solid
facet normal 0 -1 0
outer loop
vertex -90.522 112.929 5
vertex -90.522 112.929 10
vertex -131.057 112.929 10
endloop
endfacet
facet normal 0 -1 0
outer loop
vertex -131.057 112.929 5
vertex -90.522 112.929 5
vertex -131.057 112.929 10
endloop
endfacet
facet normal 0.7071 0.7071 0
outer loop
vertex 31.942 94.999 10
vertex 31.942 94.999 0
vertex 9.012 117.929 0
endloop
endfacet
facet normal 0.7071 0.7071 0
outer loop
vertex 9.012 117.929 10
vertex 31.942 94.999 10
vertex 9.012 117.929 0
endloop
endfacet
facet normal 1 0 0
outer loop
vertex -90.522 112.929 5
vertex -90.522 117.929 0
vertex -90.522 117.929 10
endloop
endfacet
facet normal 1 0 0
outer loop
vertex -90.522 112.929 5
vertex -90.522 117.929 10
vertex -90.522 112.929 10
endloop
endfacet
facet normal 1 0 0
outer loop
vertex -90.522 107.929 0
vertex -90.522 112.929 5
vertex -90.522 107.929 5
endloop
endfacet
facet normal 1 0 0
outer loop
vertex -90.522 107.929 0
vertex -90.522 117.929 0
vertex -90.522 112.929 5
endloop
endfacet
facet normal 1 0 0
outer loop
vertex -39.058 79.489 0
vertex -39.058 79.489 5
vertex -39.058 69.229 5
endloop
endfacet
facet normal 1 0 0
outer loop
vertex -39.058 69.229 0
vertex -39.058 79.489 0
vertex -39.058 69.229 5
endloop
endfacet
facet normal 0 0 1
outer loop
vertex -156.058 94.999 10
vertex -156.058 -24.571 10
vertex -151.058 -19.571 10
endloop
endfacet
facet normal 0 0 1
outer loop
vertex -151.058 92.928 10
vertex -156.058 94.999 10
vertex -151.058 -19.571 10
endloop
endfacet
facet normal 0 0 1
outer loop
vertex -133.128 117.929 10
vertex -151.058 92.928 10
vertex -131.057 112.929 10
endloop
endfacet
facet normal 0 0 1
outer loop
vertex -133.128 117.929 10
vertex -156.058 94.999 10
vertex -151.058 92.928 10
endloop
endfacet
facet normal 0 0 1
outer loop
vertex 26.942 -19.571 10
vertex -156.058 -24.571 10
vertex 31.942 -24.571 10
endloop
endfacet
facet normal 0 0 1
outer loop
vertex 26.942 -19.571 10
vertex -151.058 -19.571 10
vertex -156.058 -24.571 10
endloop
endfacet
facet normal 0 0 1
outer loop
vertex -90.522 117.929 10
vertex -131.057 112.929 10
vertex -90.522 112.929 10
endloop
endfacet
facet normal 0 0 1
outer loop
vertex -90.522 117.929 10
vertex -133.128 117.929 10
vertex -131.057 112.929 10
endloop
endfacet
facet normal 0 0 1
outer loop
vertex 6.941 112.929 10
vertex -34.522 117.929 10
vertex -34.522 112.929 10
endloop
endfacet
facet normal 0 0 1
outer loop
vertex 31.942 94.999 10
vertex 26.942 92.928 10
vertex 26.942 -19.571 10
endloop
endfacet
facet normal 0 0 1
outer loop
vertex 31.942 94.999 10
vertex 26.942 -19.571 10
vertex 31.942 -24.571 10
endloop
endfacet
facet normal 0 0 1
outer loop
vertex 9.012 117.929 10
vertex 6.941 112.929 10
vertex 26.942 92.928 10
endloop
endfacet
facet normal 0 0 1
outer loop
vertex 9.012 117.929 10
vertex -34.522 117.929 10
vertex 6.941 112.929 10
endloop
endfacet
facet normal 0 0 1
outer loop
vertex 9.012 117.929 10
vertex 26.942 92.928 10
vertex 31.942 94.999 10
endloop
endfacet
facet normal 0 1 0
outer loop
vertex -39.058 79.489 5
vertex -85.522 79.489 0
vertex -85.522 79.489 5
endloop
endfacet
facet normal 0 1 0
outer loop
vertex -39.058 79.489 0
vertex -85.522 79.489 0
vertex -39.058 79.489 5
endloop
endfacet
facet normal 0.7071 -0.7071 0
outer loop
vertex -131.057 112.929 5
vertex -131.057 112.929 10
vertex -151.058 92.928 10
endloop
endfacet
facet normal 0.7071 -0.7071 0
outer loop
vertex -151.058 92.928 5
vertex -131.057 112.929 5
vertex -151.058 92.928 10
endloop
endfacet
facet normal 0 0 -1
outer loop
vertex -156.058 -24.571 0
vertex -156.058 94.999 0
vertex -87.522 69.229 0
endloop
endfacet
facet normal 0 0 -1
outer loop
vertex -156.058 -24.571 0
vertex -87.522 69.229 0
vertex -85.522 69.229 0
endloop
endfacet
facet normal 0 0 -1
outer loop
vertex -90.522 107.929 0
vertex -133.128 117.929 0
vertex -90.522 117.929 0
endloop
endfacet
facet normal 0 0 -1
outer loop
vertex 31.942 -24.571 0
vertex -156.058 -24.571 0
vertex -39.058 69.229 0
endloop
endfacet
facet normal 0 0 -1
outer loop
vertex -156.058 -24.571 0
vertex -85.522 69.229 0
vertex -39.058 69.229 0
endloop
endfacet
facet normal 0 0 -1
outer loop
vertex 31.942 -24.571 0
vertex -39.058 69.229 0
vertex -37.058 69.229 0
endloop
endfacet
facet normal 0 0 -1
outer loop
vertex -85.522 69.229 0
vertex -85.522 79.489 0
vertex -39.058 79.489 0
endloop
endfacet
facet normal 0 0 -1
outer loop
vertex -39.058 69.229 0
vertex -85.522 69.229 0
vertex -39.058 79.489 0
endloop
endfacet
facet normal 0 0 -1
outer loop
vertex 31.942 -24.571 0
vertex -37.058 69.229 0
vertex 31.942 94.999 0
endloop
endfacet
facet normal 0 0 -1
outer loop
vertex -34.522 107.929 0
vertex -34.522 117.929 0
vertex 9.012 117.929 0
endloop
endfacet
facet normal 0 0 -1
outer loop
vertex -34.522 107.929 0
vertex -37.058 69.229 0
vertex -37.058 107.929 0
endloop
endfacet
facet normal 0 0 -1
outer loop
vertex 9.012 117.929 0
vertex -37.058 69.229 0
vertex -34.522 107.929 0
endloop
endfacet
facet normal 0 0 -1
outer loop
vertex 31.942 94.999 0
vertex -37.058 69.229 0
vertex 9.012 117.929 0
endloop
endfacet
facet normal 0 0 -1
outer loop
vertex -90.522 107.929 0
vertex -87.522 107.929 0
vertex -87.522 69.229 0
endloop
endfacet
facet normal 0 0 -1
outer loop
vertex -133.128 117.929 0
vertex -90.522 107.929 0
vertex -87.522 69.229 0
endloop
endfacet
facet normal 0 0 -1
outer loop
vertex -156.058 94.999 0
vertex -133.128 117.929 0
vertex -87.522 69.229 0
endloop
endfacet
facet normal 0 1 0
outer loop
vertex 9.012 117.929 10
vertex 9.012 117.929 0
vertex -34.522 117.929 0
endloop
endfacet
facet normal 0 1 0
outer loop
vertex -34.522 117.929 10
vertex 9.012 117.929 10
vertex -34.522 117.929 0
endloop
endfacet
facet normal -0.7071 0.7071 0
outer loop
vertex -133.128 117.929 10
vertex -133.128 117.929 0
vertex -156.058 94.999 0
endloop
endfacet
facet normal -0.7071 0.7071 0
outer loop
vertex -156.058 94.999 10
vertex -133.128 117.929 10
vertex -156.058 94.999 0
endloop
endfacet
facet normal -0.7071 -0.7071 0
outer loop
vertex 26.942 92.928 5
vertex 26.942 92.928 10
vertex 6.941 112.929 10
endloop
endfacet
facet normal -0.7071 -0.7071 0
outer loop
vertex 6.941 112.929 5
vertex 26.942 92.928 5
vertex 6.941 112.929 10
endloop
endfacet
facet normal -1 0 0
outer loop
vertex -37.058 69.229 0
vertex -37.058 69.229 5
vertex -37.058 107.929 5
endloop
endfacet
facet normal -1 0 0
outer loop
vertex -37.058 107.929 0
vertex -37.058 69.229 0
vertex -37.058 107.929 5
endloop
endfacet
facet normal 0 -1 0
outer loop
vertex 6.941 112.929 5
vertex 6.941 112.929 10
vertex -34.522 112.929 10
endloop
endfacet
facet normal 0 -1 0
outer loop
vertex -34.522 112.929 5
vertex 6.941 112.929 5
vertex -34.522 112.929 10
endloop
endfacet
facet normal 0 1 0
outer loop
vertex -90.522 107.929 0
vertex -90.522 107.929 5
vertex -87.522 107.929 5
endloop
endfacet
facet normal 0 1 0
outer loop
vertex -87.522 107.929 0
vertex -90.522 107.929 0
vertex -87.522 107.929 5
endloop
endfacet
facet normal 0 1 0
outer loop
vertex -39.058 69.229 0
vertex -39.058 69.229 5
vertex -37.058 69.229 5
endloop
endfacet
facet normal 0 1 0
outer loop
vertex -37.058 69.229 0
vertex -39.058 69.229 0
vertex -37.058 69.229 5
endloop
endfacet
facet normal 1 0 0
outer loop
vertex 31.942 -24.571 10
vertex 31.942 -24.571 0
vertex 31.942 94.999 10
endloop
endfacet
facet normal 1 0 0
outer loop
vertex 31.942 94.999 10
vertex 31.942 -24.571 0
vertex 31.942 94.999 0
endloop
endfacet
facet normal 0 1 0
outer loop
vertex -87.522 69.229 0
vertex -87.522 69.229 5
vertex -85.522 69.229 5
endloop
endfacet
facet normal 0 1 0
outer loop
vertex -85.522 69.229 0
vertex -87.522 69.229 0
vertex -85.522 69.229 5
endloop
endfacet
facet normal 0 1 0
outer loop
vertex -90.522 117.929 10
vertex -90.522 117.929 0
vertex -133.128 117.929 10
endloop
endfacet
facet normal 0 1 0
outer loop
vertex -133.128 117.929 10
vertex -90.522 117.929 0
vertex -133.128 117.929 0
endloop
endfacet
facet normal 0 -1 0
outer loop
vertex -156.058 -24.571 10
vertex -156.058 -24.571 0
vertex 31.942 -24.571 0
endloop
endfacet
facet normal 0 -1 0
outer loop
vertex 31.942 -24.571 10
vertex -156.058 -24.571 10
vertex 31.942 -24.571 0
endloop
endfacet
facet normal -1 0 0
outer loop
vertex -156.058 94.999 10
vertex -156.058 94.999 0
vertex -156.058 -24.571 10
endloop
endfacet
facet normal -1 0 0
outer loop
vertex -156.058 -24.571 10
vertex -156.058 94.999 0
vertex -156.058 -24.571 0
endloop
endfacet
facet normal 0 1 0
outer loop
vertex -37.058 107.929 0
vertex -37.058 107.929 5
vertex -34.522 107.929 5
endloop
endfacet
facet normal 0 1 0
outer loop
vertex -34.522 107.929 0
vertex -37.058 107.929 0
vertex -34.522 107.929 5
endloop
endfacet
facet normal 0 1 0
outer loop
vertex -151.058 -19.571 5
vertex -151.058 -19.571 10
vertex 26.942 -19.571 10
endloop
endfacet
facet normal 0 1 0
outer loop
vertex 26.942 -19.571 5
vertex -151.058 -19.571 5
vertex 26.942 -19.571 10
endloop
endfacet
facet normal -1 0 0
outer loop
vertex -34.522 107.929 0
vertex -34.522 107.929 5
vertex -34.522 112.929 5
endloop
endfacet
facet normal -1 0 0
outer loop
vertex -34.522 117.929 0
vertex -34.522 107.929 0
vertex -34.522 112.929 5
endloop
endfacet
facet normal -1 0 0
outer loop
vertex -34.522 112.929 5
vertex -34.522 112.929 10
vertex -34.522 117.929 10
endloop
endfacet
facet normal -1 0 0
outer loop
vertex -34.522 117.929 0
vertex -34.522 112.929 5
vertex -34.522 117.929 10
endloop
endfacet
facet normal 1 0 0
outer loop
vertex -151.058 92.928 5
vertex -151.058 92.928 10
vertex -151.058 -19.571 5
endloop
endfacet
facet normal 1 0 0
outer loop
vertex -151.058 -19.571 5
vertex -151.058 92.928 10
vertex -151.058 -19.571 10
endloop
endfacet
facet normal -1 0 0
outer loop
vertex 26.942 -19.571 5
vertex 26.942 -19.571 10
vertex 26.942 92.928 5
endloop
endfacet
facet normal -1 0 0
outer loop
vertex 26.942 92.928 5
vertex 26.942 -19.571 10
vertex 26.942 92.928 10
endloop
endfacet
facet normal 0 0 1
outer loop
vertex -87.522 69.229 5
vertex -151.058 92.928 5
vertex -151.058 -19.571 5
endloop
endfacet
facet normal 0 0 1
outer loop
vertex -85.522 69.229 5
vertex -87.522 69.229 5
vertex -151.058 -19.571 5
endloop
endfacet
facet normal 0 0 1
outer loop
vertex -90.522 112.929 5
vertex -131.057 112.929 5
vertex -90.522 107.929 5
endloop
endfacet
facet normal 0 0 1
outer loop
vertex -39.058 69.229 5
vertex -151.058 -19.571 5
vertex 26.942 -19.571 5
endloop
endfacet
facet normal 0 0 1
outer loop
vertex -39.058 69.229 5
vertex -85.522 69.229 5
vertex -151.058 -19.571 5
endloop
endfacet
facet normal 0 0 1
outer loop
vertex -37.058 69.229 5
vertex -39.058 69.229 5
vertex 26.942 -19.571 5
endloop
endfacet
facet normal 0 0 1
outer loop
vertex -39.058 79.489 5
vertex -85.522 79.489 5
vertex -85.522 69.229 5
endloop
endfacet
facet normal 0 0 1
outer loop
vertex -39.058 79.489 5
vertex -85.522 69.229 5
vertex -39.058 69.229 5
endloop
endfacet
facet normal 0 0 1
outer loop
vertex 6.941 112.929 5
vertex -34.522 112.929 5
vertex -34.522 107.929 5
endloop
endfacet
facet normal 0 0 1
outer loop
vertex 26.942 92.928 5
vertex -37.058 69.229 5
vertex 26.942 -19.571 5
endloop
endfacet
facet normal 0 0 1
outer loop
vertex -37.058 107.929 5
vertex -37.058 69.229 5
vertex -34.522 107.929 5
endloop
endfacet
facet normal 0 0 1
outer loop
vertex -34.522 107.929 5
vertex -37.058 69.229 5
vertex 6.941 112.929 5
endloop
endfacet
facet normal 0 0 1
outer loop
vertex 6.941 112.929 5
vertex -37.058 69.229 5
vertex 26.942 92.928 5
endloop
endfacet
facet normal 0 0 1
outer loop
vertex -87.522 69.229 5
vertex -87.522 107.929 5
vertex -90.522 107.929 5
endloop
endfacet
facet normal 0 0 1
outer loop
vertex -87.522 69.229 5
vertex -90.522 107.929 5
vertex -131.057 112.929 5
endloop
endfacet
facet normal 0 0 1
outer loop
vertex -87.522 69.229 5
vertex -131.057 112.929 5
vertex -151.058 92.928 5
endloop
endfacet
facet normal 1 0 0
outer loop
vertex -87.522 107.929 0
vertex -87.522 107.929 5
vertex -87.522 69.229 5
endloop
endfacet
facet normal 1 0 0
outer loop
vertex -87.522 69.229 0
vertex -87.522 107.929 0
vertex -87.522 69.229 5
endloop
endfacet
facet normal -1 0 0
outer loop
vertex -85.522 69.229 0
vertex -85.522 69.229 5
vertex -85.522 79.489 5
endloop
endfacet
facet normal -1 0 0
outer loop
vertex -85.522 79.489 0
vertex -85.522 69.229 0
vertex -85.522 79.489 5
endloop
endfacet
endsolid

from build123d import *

# Parameters (mm, degrees)
F1_DEPTH = 10
F3_DEPTH = 5
F5_DEPTH = 5
F6_W     = 56
F6_H     = 8
F6_W_2   = 46.4636435509
F6_H_2   = 28.4405329078
F7_DEPTH = 10


with BuildPart() as f1:
    # F0 (on Top) → F1 (new body)
    with BuildSketch(Plane.XY):
        Polygon((-156.0579602718, 94.9992052239), (-156.0579602718, -24.5707947761), (31.9420397282, -24.5707947761), (31.9420397282, 94.9992052239), (9.0120397282, 117.9292052239), (-133.1279602718, 117.9292052239), align=None)
    extrude(amount=F1_DEPTH)

    # F2 (on face) → F3 (cut)
    with BuildSketch(Plane.XY.offset(10)):
        Polygon((26.9420397282, 92.9281374121), (6.9409719163, 112.9292052239), (-131.05689246, 112.9292052239), (-151.0579602718, 92.9281374121), (-151.0579602718, -19.5707947761), (26.9420397282, -19.5707947761), align=None)
    extrude(amount=-F3_DEPTH, mode=Mode.SUBTRACT)

    # F4 (on face) → F5 (cut)
    with BuildSketch(Plane.XY.offset(5)):
        Polygon((-87.5216038227, 107.9292052239), (-87.5216038227, 69.2292052239), (-85.5216038227, 69.2292052239), (-85.5216038227, 107.9292052239), (-39.0579602718, 107.9292052239), (-39.0579602718, 69.2292052239), (-37.0579602718, 69.2292052239), (-37.0579602718, 107.9292052239), (-34.5216038227, 107.9292052239), (-34.5216038227, 109.9292052239), (-87.5216038227, 109.9292052239), (-90.5216038227, 109.9292052239), (-90.5216038227, 107.9292052239), align=None)
    extrude(amount=-F5_DEPTH, mode=Mode.SUBTRACT)

    # F6 (on face) → F7 (cut)
    with BuildSketch(Plane(origin=(0, 0, 0), x_dir=(1, 0, 0), z_dir=(0, 0, -1))):
        with Locations((-62.5216038227, -113.9292052239)):
            Rectangle(F6_W, F6_H)
        with Locations((-62.2897820473, -93.70893877)):
            Rectangle(F6_W_2, F6_H_2)
    extrude(amount=-F7_DEPTH, mode=Mode.SUBTRACT)


solid = f1.part
